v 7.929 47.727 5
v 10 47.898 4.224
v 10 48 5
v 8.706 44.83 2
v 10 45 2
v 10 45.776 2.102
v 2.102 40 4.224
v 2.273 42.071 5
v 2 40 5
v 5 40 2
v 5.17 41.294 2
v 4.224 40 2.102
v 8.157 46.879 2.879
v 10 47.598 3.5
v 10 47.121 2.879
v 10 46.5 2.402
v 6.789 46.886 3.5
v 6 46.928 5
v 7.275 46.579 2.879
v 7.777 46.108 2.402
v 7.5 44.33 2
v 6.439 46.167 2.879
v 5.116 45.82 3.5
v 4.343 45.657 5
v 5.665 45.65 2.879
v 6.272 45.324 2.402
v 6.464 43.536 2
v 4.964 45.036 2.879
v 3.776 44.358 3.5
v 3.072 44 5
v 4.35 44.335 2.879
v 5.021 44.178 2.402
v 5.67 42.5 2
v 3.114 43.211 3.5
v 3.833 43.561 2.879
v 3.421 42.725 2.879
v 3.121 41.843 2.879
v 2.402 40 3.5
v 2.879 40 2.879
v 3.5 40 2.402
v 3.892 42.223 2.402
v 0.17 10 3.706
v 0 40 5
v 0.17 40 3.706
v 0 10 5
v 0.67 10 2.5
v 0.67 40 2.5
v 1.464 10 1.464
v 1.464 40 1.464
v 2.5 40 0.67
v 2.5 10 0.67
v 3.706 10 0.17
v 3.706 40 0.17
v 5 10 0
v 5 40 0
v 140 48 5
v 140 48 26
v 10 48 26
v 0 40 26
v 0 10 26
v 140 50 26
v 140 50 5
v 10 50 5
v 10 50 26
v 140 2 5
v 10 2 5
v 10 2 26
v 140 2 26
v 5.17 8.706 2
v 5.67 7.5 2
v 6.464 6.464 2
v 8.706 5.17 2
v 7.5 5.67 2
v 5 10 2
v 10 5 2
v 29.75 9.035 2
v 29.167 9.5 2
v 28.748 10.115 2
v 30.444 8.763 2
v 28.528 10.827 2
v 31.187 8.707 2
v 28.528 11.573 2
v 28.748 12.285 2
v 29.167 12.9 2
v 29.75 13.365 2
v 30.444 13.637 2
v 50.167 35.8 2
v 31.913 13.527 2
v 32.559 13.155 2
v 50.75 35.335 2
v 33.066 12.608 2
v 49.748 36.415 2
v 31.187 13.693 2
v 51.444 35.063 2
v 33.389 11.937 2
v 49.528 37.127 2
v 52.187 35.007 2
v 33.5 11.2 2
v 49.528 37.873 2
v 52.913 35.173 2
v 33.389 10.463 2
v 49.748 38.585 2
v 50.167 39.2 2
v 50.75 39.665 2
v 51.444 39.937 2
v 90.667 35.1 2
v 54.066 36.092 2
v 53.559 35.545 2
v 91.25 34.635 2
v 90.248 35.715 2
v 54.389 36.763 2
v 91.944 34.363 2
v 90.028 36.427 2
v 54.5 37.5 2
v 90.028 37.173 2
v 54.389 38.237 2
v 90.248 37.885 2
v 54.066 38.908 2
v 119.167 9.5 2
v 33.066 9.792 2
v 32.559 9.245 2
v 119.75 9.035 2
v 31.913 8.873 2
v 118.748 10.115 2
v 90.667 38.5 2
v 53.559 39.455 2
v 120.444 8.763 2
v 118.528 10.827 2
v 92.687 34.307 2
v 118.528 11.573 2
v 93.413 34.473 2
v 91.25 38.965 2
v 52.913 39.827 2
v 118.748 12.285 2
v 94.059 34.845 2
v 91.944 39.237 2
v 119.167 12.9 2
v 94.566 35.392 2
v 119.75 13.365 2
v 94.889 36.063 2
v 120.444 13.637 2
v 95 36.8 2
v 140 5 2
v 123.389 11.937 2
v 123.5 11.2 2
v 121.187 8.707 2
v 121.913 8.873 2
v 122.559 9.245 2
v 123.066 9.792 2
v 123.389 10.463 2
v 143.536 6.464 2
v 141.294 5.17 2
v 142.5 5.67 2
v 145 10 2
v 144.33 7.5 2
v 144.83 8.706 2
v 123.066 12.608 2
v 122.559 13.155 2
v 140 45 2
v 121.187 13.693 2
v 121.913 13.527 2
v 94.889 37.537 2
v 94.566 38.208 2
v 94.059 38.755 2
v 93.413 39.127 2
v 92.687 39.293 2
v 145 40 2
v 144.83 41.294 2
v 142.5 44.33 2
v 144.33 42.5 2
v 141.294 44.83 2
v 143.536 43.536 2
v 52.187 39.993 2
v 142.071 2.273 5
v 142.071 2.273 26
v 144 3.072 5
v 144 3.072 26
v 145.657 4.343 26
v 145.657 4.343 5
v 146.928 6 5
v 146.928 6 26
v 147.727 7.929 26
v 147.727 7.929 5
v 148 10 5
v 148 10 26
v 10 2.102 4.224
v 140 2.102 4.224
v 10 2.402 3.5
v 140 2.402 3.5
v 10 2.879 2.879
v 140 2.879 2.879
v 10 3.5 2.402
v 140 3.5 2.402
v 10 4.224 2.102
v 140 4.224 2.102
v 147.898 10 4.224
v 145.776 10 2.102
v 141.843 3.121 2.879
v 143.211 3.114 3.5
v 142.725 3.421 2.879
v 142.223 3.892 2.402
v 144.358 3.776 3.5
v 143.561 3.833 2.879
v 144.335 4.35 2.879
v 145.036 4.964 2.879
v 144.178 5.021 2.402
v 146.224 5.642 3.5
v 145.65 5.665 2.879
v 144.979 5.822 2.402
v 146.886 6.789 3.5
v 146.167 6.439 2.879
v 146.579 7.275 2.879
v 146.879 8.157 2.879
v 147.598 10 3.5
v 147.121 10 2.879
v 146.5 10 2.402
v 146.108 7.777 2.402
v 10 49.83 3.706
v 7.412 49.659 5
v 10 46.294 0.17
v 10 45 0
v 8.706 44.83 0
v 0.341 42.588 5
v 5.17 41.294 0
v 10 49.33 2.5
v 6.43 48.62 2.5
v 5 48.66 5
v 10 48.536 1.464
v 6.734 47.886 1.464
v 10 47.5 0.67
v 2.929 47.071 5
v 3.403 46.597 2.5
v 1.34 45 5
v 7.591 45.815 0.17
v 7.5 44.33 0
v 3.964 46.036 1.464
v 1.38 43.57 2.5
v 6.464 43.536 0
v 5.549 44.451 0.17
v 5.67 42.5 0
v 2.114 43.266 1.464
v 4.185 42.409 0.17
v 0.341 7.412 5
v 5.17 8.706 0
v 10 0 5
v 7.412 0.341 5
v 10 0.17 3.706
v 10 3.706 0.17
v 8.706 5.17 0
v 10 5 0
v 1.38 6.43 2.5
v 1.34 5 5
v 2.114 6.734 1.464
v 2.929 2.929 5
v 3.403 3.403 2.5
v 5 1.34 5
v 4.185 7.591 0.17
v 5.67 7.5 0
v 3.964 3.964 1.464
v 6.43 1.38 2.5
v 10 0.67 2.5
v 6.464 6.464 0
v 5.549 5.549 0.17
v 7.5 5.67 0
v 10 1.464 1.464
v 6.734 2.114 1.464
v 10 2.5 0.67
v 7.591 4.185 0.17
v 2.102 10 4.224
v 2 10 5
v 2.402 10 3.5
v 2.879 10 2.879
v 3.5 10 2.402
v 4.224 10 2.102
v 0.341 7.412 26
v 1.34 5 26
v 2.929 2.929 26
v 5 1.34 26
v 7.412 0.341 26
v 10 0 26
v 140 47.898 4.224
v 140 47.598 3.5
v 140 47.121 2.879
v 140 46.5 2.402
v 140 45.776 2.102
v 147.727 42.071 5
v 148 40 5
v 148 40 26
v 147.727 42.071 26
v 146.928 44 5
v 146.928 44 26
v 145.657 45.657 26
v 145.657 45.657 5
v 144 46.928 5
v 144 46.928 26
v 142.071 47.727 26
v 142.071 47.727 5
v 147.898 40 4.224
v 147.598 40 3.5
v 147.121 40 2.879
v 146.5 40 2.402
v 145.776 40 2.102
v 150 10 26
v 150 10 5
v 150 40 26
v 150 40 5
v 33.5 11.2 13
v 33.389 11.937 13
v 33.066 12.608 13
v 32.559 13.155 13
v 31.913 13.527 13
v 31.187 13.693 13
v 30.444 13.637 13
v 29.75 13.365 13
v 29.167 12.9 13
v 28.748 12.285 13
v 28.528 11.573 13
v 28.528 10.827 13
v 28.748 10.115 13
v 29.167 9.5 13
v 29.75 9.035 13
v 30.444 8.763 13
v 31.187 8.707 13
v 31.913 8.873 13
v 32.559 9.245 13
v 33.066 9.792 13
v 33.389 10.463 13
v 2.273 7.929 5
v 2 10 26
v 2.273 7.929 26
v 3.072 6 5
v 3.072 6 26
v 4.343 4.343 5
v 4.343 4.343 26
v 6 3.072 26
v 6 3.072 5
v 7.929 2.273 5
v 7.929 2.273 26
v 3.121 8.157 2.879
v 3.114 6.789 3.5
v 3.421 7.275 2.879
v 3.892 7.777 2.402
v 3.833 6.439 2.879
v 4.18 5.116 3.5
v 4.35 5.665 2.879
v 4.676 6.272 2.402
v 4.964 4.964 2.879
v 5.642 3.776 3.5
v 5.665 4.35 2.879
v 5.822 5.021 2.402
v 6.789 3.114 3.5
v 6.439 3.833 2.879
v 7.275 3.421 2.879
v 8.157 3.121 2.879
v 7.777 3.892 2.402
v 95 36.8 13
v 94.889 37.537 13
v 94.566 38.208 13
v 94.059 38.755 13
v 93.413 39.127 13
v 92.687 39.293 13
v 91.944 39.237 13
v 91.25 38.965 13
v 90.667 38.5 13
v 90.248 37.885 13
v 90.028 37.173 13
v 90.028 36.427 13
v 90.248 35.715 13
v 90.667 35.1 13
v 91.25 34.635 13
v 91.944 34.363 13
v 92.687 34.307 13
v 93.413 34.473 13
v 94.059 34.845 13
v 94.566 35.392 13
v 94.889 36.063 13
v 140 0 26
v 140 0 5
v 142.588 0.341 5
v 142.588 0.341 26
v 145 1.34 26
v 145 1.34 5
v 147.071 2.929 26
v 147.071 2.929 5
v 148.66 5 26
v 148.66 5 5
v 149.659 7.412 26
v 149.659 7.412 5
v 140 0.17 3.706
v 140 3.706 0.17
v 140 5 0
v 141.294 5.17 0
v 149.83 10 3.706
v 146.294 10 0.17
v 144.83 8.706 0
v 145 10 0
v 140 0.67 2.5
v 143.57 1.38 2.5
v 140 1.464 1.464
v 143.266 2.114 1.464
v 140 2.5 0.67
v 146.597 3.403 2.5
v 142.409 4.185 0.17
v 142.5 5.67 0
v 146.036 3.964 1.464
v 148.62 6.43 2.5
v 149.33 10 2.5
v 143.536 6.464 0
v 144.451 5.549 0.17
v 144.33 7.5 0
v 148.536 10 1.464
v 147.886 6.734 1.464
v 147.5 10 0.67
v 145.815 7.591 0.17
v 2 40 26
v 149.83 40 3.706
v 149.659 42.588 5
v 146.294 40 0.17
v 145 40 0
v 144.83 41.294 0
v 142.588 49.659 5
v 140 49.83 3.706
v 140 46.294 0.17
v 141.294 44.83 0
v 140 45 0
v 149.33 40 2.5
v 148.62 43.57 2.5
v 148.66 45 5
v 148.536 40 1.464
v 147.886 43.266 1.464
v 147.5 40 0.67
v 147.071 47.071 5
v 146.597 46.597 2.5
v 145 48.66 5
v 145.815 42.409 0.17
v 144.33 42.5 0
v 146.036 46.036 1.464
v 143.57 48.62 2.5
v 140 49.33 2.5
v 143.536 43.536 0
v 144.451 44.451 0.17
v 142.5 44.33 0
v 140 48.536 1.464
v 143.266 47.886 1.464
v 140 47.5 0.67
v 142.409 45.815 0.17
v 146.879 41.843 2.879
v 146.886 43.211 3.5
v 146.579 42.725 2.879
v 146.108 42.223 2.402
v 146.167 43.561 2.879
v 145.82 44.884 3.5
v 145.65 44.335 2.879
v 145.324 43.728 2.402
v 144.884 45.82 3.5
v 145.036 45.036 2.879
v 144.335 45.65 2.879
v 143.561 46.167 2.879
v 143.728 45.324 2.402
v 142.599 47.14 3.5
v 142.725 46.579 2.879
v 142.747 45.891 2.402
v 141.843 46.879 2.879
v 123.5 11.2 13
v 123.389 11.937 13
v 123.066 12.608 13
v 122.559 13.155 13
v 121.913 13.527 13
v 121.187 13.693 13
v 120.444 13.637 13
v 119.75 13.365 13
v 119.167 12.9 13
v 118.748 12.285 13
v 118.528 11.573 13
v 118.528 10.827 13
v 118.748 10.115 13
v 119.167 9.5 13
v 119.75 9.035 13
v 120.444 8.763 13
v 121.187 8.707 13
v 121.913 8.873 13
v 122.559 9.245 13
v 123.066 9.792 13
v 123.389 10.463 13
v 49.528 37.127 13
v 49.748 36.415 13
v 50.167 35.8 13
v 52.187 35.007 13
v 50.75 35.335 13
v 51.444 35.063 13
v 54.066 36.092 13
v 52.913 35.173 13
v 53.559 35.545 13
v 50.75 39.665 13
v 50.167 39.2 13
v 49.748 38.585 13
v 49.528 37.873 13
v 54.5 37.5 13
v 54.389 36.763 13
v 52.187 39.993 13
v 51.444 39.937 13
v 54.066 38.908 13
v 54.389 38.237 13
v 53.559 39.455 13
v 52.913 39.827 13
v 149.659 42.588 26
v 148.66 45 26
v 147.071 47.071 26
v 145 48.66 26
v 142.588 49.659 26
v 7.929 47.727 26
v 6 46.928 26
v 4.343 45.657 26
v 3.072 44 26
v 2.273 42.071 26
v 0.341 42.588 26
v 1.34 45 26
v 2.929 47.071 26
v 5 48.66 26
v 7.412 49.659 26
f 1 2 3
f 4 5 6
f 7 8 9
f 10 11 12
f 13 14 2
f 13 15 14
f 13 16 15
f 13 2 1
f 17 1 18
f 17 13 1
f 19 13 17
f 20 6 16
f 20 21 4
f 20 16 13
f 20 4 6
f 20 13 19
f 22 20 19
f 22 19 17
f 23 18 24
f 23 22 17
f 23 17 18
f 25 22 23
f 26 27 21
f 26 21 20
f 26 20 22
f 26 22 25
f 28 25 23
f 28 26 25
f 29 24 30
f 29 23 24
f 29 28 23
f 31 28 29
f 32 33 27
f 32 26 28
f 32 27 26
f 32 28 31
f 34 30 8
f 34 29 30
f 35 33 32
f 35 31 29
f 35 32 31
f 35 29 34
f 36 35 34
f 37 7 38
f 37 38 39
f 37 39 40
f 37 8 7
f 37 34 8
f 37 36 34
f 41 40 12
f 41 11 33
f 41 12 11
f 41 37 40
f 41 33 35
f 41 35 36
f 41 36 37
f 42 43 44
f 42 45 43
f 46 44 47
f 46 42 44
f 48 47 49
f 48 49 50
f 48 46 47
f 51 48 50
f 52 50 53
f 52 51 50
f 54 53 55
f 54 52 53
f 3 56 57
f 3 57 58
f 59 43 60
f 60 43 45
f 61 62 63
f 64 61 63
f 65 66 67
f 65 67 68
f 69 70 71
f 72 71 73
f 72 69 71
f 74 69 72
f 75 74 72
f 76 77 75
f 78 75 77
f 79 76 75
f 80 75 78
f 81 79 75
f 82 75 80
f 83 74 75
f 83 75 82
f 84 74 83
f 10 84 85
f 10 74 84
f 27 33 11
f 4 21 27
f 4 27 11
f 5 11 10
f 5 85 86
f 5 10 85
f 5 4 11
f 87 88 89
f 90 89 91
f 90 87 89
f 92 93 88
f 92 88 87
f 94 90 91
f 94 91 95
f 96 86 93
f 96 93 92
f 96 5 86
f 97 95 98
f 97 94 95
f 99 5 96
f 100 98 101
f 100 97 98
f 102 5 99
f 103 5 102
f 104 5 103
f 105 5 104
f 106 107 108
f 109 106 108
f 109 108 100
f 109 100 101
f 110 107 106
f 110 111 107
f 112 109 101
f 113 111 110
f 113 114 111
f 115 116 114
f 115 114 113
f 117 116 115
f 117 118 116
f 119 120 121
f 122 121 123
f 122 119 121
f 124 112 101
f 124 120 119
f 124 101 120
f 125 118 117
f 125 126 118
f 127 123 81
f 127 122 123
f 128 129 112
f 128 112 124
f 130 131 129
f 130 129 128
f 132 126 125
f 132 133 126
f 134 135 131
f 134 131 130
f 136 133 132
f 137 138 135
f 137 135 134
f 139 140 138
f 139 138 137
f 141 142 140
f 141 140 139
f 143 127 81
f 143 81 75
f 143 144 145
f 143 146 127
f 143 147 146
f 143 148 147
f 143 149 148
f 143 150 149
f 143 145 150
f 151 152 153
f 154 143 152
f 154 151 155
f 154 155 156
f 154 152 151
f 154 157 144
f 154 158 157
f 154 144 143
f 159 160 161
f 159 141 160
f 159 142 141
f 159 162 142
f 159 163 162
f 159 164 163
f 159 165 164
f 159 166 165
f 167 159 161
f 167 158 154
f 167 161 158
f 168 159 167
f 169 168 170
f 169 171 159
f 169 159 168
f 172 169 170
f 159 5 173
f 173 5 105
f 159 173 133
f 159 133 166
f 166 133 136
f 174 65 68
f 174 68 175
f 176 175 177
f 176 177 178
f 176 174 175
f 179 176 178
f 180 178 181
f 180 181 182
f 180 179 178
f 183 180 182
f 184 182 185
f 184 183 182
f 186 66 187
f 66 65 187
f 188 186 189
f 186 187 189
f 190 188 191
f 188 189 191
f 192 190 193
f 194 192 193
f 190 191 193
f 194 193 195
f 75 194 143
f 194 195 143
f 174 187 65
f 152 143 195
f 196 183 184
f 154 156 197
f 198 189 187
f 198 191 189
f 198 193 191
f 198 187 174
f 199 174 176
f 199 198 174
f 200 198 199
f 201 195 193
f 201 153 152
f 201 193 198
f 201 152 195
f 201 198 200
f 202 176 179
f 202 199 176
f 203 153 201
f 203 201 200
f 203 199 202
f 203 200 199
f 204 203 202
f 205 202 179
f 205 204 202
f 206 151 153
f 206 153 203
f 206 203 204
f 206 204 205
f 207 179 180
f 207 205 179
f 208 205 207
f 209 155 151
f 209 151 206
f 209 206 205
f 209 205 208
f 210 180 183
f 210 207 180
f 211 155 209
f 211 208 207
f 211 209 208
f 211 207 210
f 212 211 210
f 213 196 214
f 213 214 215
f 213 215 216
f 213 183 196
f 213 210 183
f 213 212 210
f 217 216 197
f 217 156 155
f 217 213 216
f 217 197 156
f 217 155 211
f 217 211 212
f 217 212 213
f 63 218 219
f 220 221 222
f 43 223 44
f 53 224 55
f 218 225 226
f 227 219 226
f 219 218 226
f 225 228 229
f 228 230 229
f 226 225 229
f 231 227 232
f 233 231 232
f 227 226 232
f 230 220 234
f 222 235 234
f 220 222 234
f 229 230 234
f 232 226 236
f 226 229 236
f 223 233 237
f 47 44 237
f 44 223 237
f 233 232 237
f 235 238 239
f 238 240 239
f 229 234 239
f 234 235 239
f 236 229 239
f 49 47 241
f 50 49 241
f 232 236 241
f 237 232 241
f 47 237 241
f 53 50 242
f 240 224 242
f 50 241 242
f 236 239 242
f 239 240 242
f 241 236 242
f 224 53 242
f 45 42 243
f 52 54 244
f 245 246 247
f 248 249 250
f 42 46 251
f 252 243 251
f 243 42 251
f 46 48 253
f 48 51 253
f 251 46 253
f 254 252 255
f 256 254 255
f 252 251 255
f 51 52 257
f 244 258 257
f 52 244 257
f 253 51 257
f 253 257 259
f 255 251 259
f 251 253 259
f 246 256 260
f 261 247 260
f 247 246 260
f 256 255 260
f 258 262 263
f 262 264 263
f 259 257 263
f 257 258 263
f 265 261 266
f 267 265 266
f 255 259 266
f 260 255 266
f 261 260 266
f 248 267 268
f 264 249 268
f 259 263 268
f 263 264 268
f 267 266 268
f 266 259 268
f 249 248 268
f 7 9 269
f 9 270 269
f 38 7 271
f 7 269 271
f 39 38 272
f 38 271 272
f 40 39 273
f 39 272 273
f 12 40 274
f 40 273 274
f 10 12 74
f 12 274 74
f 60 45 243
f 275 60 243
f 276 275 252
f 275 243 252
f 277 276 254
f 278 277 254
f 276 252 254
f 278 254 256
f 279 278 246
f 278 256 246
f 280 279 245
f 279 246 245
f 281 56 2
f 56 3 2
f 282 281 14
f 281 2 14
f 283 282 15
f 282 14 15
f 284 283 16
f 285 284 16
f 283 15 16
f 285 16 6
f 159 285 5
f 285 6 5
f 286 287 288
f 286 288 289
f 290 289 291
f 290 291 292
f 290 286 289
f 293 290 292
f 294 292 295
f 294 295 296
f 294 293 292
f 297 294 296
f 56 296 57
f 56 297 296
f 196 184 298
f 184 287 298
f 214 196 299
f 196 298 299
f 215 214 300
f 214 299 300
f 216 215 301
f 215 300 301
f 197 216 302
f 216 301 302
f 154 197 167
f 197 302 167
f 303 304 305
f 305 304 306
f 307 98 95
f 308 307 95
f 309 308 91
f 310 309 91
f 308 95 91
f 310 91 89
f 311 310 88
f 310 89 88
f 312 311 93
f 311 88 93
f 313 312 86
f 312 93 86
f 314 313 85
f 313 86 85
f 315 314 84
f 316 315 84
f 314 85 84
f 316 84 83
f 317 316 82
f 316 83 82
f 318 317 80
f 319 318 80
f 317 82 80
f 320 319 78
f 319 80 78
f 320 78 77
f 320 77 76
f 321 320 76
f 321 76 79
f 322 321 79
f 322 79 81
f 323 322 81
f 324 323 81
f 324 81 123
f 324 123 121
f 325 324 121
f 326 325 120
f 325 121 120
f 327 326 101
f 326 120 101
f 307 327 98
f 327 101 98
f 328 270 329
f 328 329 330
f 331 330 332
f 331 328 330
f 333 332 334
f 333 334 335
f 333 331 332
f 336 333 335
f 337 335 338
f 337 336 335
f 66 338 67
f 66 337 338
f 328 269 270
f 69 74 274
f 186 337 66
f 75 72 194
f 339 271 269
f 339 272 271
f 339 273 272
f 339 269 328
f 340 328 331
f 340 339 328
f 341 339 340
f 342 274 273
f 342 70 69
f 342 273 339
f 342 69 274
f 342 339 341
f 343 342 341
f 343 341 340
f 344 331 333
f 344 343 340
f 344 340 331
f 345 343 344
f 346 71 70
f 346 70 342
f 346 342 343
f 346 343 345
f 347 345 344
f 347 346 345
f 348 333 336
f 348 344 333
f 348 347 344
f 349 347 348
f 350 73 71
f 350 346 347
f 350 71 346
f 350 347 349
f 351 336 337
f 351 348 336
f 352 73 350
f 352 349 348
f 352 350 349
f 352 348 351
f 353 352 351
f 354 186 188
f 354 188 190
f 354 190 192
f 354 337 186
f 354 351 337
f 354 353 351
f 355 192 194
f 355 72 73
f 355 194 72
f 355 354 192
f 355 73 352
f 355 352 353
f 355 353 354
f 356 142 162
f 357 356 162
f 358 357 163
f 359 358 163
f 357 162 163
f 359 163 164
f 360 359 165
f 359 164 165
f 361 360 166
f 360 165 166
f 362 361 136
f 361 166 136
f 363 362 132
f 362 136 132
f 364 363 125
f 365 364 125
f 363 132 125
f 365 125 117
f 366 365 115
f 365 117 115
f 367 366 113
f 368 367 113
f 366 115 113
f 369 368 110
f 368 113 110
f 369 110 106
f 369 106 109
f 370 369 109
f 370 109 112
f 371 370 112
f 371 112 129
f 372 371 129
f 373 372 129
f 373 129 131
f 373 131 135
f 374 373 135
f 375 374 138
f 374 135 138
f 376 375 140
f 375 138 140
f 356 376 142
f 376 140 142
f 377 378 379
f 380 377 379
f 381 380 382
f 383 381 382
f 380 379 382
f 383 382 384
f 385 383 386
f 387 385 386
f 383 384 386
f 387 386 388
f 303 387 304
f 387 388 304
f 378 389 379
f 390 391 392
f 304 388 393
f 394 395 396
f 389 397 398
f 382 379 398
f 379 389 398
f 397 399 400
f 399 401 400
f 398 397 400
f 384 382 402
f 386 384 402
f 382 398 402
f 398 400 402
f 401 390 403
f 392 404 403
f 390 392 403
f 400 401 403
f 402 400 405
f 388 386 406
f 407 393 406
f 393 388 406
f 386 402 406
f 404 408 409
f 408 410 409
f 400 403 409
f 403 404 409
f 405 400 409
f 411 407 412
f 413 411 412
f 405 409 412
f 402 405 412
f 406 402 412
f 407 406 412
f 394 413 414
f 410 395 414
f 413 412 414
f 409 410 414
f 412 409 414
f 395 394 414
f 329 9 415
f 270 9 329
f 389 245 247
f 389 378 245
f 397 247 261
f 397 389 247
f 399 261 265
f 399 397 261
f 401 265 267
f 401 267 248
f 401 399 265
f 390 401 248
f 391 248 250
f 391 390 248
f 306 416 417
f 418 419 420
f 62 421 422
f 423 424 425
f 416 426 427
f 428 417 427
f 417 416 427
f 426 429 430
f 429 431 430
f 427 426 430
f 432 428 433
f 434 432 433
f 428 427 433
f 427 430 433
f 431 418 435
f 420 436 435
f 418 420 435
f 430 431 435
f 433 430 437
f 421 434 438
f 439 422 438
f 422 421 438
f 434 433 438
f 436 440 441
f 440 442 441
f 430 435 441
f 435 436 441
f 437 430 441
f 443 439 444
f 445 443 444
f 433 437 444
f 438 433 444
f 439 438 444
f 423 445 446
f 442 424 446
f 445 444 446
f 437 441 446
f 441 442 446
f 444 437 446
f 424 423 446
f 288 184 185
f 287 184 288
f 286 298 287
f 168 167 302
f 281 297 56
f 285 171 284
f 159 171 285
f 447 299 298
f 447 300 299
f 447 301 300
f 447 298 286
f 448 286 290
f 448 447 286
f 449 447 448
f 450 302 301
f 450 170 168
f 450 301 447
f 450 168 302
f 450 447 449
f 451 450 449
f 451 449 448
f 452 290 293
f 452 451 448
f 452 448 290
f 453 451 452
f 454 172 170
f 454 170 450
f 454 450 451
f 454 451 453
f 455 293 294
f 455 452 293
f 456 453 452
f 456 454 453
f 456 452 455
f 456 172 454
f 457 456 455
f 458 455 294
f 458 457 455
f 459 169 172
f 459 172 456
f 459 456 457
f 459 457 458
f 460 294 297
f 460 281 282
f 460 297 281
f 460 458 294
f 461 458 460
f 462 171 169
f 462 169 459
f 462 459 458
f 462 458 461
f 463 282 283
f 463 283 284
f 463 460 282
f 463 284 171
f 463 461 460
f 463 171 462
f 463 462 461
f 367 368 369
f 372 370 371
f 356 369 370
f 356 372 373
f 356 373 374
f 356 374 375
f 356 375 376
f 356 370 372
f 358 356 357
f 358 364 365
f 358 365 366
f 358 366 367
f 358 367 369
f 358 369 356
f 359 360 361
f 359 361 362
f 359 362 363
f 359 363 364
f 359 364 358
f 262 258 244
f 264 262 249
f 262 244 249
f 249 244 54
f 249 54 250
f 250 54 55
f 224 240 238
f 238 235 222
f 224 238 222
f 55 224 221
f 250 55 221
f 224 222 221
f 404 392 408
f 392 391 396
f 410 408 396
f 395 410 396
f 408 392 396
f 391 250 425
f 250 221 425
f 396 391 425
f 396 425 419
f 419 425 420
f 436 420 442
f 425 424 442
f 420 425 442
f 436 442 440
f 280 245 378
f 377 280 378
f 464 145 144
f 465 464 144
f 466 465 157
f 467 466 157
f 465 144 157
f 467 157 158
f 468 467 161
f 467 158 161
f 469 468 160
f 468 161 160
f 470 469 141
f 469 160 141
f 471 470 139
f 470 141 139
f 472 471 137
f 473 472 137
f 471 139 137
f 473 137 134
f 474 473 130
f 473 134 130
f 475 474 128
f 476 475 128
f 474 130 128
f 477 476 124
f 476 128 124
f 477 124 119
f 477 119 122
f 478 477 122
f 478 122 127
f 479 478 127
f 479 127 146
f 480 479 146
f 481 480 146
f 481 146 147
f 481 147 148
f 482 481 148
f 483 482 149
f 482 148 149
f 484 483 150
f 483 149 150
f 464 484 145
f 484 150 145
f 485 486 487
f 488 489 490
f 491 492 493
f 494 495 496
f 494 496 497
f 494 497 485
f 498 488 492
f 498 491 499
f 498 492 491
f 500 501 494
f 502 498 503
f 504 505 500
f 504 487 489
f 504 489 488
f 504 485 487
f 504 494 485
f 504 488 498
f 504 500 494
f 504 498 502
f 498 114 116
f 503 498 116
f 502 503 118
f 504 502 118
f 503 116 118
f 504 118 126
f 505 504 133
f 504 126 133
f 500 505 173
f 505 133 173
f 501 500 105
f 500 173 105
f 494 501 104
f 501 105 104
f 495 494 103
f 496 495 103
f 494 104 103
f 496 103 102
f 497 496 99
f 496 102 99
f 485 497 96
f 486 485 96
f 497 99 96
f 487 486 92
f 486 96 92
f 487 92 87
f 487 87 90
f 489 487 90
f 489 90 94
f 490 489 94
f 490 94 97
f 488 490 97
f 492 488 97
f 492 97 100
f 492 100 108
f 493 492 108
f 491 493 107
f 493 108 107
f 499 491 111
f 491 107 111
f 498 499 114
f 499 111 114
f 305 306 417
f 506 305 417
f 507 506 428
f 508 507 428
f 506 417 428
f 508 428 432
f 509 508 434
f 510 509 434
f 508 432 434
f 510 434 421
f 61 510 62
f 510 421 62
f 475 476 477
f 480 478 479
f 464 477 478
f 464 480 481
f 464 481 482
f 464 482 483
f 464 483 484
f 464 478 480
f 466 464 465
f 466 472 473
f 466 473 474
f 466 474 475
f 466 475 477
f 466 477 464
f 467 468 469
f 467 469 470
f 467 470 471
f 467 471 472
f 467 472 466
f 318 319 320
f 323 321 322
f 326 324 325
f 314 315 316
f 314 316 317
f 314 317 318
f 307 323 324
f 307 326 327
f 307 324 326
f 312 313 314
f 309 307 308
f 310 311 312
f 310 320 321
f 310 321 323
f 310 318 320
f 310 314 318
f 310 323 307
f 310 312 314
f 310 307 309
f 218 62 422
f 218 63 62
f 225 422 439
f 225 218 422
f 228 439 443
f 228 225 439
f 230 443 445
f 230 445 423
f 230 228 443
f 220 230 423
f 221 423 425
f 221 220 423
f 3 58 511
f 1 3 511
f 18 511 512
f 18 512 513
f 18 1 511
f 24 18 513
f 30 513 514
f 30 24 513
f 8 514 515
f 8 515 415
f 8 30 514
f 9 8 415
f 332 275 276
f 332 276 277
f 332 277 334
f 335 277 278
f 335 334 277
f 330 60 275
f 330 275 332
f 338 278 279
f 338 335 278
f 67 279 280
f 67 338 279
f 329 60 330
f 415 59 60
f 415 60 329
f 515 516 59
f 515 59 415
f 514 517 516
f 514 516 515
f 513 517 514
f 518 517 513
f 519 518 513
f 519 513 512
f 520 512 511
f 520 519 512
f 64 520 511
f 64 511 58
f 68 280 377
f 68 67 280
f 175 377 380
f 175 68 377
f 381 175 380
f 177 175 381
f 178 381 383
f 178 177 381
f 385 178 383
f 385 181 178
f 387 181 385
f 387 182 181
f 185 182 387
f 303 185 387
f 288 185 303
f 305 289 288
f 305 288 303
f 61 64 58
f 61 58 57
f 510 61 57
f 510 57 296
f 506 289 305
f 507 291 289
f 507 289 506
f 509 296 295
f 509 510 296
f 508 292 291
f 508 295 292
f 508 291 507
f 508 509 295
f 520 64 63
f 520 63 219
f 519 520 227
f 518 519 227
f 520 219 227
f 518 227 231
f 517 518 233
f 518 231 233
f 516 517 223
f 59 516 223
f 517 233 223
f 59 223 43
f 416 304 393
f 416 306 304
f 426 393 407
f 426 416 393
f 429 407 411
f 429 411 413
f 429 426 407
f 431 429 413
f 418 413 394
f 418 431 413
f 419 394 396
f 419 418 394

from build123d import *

# Parameters (mm, degrees)
PAD001_DEPTH = 26
FILLET_R     = 5
THICKNESS_T  = -2
SKETCH010_R  = 2.5
PAD004_DEPTH = 11


with BuildPart() as part:
    # Sketch002 → Pad001 (new body)
    with BuildSketch(Plane.XY):
        with BuildLine():
            Line((10, 0), (140, 0))
            ThreePointArc((140, 0), (147.071068, 2.928932), (150, 10))
            Line((150, 10), (150, 40))
            ThreePointArc((150, 40), (147.071068, 47.071068), (140, 50))
            Line((140, 50), (10, 50))
            ThreePointArc((10, 50), (2.928932, 47.071068), (0, 40))
            Line((0, 40), (0, 10))
            ThreePointArc((0, 10), (2.928932, 2.928932), (10, 0))
        make_face()
    extrude(amount=PAD001_DEPTH)

    # Fillet
    fillet_edges = [part.edges().sort_by_distance(p)[0] for p in [
        (75, 0, 0),
    ]]
    fillet(fillet_edges, radius=FILLET_R)

    # Thickness
    thickness_openings = [part.faces().sort_by_distance(p)[0] for p in [
        (75, 25, 26),
    ]]
    offset(amount=THICKNESS_T, openings=thickness_openings)

    # Sketch010 (on Face28 of Thickness) → Pad004 (join)
    with BuildSketch(Plane.XY.offset(2)):
        with Locations((52, 37.5)):
            Circle(SKETCH010_R)
        with Locations((92.5, 36.8)):
            Circle(SKETCH010_R)
        with Locations((121, 11.2)):
            Circle(SKETCH010_R)
        with Locations((31, 11.2)):
            Circle(SKETCH010_R)
    extrude(amount=PAD004_DEPTH)


solid = part.part
